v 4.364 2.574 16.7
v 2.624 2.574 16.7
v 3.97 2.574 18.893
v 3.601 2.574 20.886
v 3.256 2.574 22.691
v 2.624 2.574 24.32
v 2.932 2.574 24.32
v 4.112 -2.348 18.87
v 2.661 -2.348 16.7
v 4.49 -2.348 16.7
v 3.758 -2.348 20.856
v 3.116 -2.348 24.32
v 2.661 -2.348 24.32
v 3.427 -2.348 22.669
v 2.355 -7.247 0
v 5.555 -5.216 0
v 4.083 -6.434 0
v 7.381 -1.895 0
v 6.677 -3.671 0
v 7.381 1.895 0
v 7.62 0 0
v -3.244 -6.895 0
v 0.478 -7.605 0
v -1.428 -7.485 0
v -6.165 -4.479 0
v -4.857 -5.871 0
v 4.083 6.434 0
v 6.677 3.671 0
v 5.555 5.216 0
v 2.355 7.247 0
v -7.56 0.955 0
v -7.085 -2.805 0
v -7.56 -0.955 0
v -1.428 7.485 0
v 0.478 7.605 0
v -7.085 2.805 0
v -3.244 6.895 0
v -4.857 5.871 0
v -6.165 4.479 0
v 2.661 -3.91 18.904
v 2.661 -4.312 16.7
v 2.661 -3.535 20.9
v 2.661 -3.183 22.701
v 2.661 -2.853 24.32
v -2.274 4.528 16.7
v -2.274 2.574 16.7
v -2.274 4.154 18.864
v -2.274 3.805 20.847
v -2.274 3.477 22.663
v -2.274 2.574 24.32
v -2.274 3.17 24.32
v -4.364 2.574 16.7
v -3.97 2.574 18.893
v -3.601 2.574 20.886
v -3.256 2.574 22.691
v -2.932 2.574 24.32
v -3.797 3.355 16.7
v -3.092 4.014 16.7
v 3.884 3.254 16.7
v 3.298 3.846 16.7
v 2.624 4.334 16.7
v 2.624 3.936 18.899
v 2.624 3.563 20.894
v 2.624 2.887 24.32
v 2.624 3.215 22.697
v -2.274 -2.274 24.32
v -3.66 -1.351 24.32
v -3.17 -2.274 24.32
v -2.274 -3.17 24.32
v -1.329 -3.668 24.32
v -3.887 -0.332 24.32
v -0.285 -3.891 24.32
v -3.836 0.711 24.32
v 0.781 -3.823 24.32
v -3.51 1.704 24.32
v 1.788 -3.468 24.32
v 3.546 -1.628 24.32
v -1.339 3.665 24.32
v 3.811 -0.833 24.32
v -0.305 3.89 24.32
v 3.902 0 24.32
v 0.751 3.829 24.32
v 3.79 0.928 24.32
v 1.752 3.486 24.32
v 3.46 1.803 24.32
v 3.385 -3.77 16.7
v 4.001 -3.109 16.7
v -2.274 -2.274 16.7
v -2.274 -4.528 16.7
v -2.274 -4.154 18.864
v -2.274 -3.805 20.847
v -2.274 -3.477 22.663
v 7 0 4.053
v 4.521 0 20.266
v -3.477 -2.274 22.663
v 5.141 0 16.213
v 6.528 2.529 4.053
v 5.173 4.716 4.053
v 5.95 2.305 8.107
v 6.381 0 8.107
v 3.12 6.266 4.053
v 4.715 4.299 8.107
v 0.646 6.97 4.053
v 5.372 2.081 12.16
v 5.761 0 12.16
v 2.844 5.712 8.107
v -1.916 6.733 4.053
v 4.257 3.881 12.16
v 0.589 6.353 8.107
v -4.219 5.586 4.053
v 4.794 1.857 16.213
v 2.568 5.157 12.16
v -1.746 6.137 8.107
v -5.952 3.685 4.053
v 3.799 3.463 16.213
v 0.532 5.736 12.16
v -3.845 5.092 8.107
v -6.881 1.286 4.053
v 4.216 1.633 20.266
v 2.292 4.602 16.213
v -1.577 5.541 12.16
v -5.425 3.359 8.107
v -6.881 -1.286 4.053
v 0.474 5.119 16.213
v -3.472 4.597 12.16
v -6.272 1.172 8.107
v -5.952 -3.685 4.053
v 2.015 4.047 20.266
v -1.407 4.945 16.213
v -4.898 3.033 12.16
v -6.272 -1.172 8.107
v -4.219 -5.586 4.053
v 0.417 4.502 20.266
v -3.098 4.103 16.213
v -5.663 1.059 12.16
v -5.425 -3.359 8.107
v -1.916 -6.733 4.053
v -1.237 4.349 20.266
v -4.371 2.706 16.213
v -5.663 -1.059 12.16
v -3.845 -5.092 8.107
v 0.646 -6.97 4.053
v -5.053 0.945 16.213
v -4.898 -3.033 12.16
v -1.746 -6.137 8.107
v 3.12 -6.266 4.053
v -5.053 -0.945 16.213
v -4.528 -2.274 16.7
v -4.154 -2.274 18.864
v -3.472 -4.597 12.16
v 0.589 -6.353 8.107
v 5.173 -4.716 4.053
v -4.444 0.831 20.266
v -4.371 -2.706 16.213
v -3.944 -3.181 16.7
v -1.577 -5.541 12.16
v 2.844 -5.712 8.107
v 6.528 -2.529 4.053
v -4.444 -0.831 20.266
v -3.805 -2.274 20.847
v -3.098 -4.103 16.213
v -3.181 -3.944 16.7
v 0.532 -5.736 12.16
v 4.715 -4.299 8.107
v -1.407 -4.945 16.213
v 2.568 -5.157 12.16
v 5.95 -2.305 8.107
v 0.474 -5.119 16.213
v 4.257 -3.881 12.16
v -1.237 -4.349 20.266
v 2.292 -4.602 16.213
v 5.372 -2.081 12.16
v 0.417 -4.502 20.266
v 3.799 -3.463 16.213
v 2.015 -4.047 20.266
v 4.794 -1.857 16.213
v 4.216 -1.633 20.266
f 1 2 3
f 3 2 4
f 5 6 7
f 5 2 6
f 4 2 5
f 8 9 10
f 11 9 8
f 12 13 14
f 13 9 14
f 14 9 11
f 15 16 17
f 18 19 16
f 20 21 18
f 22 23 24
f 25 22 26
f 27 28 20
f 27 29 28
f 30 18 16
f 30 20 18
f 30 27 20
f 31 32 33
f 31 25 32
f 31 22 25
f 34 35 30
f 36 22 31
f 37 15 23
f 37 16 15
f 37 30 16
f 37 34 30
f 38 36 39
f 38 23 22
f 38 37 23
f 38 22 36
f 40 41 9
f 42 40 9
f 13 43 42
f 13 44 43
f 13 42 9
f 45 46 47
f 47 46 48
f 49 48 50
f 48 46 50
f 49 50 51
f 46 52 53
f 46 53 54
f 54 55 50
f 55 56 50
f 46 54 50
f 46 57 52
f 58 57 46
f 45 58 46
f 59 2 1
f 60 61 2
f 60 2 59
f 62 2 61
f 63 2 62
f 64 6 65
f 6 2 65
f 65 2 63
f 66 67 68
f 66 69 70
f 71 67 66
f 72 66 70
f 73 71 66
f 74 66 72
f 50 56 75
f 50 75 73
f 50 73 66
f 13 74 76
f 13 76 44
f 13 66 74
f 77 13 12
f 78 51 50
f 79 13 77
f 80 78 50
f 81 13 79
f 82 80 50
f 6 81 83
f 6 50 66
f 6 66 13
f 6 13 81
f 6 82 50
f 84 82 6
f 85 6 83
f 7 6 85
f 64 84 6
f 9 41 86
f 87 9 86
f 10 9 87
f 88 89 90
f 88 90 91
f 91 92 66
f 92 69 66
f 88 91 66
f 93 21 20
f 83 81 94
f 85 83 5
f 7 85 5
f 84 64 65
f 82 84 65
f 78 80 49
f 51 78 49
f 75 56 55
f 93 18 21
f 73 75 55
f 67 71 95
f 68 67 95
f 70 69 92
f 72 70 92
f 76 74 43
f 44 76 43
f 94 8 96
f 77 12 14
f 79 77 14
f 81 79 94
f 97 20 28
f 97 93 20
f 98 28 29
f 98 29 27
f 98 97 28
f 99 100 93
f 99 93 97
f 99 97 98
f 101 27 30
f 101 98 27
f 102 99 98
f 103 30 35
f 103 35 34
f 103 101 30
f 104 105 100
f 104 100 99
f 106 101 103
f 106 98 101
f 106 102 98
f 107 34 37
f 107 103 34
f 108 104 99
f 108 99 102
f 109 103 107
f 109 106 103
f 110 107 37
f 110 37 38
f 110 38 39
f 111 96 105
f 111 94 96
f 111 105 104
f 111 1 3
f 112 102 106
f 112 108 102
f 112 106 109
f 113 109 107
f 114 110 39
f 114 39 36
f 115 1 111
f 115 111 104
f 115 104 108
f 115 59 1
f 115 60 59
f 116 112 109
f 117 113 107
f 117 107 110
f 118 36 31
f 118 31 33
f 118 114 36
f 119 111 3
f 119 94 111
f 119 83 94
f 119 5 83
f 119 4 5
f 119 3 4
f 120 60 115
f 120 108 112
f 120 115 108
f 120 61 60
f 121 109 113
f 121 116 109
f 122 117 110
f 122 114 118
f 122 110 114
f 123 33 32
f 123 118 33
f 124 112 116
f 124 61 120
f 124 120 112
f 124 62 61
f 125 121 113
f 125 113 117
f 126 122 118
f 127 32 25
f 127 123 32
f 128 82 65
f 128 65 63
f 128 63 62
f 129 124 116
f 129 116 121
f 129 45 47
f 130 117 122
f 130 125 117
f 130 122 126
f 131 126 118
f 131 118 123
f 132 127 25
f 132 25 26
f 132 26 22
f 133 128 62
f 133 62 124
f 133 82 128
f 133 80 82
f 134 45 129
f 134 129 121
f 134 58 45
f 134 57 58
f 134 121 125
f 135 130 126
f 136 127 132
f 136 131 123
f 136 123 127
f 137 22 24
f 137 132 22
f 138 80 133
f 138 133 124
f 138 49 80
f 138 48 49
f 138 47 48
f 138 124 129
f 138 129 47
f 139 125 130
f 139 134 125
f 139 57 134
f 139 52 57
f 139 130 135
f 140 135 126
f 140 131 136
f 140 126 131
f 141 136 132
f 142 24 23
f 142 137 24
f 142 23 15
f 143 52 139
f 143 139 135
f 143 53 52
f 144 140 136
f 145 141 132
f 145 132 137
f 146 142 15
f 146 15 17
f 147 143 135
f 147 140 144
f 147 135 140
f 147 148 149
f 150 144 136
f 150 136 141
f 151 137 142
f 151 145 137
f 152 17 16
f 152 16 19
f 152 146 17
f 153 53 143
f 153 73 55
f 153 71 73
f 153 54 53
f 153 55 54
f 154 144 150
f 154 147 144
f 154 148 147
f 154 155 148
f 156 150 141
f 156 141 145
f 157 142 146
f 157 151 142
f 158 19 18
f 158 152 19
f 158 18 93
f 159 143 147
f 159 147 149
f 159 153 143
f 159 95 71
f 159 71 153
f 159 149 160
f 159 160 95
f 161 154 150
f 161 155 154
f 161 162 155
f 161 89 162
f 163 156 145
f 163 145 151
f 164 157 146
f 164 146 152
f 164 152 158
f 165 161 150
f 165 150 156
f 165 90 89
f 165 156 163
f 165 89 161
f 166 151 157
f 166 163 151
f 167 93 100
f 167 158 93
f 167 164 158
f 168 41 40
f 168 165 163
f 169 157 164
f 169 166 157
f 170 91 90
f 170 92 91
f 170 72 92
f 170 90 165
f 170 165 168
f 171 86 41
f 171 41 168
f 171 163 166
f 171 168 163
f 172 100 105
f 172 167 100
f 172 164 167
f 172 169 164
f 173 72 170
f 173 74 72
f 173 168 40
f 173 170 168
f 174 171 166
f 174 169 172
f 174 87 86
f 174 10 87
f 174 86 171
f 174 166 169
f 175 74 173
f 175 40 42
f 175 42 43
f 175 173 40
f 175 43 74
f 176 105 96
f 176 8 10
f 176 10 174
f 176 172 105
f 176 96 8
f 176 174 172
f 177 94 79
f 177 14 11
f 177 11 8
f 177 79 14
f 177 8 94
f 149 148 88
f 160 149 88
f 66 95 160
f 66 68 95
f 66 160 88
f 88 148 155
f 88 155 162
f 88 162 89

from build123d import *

# Parameters (mm, degrees)
F3_W     = 2.124586
F3_H     = 2.646484
F3_W_2   = 2.326301
F3_H_2   = 2.416364
F3_W_3   = 3.771314
F3_H_3   = 3.010656
F3_W_4   = 3.903168
F3_H_4   = 2.436567
F4_DEPTH = 7.62


with BuildPart() as f1:
    # F0 (on Front) → F1 (revolve)
    with BuildSketch(Plane.XZ):
        Polygon((0, 24.31952), (0, 0), (7.62, 0), (3.901527, 24.31952), align=None)
    revolve(axis=Axis((0, 0, 12.15976), (0, 0, 1)))

    # F3 (on offset) → F4 (cut)
    with BuildSketch(Plane.XY.offset(24.31952)):
        with Locations((3.723198, -3.671215)):
            Rectangle(F3_W, F3_H)
        with Locations((3.787343, 3.782073)):
            Rectangle(F3_W_2, F3_H_2)
        with Locations((-4.159726, -3.779338)):
            Rectangle(F3_W_3, F3_H_3)
        with Locations((-4.225653, 3.792174)):
            Rectangle(F3_W_4, F3_H_4)
    extrude(amount=-F4_DEPTH, mode=Mode.SUBTRACT)


solid = f1.part
